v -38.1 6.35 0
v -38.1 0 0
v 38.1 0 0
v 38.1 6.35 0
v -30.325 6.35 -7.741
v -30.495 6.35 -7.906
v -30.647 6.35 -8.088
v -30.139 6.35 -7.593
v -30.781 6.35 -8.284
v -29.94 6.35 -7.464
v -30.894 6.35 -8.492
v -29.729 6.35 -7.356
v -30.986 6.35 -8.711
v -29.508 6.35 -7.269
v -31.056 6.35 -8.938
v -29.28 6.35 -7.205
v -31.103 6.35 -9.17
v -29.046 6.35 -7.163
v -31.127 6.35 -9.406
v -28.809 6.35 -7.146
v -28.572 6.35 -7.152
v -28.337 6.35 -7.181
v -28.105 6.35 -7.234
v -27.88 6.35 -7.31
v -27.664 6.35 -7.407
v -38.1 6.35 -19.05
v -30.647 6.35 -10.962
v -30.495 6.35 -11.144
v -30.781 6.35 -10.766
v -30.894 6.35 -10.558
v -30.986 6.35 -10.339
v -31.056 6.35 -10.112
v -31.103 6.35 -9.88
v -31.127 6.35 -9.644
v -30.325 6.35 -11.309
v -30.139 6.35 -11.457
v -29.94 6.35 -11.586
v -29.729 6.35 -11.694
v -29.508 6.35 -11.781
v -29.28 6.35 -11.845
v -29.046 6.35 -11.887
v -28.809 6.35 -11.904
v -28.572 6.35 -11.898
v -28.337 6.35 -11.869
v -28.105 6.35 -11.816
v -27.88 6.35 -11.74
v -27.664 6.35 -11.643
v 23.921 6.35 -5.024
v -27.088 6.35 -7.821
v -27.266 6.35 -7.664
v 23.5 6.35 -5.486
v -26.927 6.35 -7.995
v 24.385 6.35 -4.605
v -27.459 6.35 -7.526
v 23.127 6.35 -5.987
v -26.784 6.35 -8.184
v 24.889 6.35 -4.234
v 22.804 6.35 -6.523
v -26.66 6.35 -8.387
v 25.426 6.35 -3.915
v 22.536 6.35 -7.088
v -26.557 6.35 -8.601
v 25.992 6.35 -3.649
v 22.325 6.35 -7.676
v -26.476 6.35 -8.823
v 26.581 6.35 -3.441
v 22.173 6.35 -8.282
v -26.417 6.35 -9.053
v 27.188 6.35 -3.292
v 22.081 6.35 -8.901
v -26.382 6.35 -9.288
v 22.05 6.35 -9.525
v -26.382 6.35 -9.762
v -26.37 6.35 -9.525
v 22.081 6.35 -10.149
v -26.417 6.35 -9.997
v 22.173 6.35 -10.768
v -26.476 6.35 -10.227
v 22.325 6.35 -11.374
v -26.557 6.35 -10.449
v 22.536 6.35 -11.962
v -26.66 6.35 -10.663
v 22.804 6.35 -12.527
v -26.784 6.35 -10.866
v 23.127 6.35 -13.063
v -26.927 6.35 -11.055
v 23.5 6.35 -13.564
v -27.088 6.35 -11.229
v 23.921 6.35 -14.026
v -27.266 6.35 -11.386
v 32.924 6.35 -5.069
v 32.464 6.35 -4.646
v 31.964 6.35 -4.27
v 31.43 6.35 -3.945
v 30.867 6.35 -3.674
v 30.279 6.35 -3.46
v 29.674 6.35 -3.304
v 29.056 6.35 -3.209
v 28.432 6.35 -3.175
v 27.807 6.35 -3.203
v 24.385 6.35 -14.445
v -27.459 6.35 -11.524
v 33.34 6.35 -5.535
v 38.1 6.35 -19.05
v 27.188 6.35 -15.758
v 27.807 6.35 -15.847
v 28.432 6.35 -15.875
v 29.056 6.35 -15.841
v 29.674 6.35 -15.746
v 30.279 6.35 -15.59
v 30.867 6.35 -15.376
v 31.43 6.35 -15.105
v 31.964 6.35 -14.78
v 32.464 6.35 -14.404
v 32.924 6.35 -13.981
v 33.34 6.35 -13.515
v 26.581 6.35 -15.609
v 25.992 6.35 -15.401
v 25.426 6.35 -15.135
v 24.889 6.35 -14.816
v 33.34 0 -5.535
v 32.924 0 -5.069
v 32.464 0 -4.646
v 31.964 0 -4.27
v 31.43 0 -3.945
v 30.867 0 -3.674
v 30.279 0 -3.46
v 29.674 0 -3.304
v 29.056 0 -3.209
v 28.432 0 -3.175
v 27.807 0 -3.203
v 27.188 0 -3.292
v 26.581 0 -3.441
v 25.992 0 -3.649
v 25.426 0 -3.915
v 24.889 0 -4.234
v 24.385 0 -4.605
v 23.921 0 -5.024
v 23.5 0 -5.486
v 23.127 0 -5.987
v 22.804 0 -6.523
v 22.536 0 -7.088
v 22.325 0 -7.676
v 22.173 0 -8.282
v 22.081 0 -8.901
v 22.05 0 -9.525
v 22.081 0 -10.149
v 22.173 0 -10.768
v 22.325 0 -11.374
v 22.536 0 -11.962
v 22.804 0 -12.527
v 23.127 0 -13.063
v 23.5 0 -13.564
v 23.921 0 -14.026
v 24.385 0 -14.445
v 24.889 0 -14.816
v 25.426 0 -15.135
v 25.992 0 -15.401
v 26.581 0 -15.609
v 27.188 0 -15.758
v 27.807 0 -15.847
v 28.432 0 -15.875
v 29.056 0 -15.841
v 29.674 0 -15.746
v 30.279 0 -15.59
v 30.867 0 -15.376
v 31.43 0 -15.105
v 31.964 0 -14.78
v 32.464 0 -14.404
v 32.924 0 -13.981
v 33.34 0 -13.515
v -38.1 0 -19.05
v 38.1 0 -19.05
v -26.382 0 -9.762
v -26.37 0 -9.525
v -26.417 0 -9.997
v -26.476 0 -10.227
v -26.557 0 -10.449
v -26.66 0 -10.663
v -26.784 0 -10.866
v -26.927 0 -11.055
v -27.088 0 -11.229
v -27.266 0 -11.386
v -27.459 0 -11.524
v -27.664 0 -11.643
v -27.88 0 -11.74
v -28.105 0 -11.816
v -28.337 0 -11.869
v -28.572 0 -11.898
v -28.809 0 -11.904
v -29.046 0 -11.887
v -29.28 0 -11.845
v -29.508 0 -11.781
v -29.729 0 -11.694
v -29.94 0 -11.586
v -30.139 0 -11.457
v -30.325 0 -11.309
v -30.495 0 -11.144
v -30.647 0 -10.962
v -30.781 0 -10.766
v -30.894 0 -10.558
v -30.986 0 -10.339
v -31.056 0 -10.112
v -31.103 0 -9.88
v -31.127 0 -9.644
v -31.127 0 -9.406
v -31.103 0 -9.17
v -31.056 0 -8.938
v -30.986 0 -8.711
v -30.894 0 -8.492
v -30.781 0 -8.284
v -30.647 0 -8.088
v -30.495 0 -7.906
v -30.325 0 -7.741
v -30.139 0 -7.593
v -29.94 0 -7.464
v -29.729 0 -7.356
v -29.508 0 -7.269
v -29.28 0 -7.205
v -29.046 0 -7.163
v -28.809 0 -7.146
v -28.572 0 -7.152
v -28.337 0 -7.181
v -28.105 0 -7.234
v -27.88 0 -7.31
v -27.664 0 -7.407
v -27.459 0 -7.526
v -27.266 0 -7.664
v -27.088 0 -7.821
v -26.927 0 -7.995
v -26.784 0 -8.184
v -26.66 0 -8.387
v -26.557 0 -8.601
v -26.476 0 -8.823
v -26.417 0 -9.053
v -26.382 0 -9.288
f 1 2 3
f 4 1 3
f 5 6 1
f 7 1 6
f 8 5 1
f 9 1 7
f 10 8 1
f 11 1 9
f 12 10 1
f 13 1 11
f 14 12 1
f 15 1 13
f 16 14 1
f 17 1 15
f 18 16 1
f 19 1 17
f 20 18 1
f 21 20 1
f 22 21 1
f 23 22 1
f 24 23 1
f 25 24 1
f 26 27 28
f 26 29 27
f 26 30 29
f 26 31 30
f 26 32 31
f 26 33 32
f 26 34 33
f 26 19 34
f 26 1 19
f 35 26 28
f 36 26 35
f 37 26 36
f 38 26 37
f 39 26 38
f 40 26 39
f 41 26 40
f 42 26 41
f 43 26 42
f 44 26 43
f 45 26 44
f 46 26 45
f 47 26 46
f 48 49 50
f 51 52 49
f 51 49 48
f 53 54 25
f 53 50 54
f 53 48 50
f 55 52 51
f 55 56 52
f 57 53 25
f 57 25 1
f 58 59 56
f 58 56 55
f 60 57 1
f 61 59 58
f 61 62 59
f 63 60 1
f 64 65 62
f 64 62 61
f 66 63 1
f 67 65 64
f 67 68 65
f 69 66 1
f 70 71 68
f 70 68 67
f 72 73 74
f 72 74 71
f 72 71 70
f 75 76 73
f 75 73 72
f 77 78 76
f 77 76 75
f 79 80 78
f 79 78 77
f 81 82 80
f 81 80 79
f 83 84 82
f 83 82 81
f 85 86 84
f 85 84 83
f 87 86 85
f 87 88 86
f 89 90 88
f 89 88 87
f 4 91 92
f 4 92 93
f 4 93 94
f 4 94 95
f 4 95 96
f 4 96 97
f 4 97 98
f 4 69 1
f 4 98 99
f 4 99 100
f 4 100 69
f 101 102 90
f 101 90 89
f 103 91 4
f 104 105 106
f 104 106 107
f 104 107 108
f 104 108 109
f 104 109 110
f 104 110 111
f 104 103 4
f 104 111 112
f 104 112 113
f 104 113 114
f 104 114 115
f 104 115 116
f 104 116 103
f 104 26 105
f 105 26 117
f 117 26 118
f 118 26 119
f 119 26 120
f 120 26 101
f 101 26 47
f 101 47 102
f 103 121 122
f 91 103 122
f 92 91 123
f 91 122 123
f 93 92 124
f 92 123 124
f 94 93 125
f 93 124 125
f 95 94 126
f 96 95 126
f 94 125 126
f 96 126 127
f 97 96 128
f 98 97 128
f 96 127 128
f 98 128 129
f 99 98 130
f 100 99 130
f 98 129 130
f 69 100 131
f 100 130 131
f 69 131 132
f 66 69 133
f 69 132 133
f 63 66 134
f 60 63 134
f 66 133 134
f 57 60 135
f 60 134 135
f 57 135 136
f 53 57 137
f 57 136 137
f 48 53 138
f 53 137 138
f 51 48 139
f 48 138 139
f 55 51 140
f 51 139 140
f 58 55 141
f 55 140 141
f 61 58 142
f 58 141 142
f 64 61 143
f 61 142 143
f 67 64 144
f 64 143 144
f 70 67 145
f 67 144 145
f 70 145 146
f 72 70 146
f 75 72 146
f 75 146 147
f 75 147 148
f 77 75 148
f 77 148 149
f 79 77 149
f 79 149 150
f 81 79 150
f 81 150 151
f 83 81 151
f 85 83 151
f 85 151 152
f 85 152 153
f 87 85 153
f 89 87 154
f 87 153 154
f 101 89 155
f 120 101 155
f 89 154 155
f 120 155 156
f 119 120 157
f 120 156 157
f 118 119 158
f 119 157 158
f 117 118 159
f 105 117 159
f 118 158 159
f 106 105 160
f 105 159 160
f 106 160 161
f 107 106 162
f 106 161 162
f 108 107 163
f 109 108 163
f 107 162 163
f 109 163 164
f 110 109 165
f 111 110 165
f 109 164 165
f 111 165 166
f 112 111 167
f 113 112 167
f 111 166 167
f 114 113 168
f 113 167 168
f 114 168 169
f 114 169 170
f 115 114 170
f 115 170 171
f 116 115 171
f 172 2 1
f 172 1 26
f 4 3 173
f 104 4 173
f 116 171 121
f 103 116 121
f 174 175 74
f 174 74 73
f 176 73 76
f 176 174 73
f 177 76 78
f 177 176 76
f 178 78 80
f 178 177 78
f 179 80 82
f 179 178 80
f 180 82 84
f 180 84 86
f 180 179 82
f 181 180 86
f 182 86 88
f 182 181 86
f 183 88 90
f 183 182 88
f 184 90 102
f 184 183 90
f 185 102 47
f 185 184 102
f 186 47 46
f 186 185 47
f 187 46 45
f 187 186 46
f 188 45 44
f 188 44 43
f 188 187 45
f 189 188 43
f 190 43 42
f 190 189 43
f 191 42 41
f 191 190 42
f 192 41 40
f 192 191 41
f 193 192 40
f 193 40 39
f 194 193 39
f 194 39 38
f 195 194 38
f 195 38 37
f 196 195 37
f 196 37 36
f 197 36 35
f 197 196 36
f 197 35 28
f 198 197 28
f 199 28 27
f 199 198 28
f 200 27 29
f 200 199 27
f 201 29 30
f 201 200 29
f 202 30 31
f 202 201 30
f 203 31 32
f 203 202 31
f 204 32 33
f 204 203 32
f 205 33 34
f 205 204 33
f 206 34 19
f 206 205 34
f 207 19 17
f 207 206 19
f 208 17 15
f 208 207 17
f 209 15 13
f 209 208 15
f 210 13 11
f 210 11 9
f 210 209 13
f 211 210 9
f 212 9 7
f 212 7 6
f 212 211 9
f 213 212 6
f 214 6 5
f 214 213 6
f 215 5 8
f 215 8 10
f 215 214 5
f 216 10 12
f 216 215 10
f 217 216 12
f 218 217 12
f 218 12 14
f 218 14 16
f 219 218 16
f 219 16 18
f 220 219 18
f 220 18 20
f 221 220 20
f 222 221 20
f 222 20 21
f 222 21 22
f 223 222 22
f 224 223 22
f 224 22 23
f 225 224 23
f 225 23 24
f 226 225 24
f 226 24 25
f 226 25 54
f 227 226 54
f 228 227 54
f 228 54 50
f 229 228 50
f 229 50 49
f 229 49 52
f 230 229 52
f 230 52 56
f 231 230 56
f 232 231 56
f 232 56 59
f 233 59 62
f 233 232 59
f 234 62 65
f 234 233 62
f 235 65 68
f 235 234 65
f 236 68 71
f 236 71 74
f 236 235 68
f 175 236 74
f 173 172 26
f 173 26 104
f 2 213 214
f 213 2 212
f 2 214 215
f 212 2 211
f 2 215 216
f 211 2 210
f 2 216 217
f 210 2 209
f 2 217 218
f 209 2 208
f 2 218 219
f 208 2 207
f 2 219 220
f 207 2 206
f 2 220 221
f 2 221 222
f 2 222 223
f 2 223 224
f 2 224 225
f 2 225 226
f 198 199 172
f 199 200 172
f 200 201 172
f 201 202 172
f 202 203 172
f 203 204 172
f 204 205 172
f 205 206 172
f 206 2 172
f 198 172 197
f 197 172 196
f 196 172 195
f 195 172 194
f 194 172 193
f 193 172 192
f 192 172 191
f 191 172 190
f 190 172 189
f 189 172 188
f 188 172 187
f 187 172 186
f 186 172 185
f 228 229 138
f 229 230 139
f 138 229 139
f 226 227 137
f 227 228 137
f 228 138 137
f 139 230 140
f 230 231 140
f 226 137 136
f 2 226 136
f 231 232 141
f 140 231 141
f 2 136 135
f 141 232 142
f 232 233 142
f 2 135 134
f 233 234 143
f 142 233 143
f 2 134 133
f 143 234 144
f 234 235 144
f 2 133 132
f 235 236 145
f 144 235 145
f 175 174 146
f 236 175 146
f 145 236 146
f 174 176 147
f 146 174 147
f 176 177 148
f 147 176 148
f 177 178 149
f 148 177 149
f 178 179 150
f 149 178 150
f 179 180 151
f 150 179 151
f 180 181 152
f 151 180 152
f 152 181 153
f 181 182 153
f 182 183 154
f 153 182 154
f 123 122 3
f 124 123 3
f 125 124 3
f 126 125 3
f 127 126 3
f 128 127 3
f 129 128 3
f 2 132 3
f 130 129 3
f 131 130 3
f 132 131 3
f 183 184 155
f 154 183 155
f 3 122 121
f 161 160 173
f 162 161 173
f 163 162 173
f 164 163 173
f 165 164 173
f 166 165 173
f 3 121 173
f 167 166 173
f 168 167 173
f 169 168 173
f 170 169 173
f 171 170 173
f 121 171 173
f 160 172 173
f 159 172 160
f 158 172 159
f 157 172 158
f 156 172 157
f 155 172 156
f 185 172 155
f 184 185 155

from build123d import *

# Parameters (mm, degrees)
SKETCH1_W           = 76.2
SKETCH1_H           = 19.05
SKETCH1_R           = 2.38
BOSS_EXTRUDE1_DEPTH = 6.35


with BuildPart() as part:
    # Sketch1 → Boss-Extrude1 (new body)
    with BuildSketch(Plane(origin=(0, 0, 0), x_dir=(1, 0, 0), z_dir=(0, 1, 0))):
        with Locations((0, 9.525)):
            Rectangle(SKETCH1_W, SKETCH1_H)
        with Locations((-28.75, 9.525)):
            Circle(SKETCH1_R, mode=Mode.SUBTRACT)
        with BuildLine():
            Line((33.34, 13.514849621), (33.34, 5.535150379))
            ThreePointArc((33.34, 5.535150379), (22.05, 9.525), (33.34, 13.514849621))
        make_face(mode=Mode.SUBTRACT)
    extrude(amount=BOSS_EXTRUDE1_DEPTH)


solid = part.part
